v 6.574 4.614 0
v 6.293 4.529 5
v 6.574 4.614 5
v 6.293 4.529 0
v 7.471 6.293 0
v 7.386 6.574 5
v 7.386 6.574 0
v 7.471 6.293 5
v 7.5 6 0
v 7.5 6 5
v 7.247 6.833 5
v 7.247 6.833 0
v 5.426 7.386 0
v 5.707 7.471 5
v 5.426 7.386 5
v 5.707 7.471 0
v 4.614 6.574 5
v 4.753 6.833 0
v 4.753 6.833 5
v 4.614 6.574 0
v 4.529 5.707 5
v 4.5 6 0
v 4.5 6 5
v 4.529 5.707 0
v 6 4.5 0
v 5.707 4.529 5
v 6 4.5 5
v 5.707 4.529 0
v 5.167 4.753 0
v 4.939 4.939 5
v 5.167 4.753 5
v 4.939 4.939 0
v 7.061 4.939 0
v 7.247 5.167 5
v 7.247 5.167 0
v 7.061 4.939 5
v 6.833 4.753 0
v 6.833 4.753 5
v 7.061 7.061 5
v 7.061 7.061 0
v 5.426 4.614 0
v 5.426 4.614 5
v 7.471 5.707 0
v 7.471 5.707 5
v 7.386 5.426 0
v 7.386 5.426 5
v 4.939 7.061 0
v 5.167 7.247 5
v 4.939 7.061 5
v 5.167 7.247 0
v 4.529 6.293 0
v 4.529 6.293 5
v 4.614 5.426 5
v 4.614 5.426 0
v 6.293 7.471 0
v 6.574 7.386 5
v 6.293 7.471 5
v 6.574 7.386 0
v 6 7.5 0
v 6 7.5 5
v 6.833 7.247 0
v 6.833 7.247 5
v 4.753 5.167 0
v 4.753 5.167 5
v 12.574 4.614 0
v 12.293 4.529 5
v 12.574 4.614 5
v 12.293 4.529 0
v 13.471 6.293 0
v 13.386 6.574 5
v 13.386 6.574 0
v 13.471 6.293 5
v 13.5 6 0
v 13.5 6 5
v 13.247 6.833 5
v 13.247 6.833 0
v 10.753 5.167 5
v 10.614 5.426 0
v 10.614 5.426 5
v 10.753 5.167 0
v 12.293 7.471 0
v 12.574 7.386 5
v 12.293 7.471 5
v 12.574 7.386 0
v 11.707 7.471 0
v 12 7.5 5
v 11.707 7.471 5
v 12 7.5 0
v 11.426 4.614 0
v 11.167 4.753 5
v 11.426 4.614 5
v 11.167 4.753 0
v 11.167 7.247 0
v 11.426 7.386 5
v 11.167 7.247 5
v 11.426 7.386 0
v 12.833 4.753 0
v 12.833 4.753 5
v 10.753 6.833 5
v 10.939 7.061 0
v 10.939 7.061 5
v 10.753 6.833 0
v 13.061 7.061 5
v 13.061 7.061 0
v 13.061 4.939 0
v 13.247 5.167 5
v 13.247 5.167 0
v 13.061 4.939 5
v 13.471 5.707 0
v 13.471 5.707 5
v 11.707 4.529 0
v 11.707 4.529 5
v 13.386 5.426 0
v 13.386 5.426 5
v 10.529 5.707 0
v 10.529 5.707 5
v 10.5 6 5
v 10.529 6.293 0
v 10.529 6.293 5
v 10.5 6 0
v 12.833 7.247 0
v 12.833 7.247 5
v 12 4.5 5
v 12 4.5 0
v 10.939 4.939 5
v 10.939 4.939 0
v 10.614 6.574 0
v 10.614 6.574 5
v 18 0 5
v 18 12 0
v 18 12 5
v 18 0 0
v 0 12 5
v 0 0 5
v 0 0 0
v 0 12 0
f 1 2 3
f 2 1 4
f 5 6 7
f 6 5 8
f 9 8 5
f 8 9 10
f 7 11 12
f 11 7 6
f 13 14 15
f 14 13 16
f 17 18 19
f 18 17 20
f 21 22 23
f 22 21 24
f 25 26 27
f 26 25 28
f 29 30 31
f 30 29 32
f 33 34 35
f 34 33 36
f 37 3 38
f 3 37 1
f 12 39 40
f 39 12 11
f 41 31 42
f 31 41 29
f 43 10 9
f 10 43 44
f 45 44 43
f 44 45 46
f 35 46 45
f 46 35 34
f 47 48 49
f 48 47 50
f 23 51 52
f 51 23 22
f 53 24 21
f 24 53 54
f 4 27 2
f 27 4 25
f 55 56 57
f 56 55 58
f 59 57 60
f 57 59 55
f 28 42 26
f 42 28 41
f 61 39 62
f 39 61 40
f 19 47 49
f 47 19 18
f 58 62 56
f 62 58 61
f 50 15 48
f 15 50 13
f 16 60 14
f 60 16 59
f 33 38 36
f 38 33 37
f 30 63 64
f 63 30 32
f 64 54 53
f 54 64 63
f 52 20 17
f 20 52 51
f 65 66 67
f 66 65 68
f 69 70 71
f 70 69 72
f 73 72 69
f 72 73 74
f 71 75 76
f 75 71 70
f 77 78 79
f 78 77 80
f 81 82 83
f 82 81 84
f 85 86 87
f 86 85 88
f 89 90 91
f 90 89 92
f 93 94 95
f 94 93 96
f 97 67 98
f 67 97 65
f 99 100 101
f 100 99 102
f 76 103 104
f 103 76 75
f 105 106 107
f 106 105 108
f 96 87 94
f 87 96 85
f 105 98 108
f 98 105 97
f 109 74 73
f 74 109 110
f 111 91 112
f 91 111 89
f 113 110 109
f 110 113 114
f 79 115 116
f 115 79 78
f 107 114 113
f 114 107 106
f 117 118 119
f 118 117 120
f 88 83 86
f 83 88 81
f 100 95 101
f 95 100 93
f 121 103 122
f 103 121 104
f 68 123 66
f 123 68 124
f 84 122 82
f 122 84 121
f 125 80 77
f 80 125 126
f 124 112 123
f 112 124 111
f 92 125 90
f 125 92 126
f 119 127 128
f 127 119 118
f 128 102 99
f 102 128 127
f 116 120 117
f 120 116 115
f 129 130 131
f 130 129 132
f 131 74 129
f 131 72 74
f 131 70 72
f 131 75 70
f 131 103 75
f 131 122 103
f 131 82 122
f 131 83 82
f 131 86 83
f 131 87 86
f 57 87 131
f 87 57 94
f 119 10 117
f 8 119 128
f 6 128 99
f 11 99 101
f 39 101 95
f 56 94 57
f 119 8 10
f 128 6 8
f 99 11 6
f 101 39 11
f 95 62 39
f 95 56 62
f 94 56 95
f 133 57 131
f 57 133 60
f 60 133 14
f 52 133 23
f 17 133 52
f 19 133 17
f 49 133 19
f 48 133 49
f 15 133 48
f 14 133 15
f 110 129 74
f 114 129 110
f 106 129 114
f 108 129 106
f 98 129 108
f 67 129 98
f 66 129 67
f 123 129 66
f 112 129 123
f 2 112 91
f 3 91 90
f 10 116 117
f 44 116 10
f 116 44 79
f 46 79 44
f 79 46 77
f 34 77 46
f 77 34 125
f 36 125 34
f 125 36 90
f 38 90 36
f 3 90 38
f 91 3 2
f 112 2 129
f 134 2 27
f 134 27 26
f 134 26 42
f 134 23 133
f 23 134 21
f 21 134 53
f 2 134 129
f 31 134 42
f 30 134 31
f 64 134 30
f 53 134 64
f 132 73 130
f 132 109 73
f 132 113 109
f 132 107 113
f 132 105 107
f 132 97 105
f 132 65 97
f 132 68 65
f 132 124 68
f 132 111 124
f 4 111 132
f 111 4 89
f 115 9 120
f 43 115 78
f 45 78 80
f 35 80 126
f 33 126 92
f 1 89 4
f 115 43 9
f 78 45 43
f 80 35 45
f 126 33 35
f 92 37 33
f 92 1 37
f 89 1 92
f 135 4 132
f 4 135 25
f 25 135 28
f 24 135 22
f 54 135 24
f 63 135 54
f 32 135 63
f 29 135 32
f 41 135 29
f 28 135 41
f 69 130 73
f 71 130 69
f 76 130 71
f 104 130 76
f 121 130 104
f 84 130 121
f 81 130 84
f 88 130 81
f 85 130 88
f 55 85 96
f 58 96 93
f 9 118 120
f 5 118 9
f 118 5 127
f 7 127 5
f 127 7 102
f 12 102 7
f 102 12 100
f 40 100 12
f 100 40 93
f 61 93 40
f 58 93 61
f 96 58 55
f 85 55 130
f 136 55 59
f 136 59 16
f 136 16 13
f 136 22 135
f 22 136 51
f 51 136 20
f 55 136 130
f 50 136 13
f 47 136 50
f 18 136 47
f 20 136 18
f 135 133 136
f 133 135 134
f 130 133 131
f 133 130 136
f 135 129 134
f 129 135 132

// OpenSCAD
$fn = 32;

// ----------------------------------------------------------------------
// Micro pad: two-hole pad, 5-20 mm class
// ----------------------------------------------------------------------

// --- parameters (mm) ---
pad_l = 18;               // pad length, X
pad_w = 12;               // pad width, Y
pad_t = 5;                // pad thickness, Z
hole_d = 3;               // hole diameter
hole_x = 6;               // X of the first hole centre

difference() {
  cube([pad_l, pad_w, pad_t]);
  for (x = [hole_x, pad_l - hole_x])
    translate([x, pad_w / 2, -1])
      cylinder(h = pad_t + 2, d = hole_d);
}
